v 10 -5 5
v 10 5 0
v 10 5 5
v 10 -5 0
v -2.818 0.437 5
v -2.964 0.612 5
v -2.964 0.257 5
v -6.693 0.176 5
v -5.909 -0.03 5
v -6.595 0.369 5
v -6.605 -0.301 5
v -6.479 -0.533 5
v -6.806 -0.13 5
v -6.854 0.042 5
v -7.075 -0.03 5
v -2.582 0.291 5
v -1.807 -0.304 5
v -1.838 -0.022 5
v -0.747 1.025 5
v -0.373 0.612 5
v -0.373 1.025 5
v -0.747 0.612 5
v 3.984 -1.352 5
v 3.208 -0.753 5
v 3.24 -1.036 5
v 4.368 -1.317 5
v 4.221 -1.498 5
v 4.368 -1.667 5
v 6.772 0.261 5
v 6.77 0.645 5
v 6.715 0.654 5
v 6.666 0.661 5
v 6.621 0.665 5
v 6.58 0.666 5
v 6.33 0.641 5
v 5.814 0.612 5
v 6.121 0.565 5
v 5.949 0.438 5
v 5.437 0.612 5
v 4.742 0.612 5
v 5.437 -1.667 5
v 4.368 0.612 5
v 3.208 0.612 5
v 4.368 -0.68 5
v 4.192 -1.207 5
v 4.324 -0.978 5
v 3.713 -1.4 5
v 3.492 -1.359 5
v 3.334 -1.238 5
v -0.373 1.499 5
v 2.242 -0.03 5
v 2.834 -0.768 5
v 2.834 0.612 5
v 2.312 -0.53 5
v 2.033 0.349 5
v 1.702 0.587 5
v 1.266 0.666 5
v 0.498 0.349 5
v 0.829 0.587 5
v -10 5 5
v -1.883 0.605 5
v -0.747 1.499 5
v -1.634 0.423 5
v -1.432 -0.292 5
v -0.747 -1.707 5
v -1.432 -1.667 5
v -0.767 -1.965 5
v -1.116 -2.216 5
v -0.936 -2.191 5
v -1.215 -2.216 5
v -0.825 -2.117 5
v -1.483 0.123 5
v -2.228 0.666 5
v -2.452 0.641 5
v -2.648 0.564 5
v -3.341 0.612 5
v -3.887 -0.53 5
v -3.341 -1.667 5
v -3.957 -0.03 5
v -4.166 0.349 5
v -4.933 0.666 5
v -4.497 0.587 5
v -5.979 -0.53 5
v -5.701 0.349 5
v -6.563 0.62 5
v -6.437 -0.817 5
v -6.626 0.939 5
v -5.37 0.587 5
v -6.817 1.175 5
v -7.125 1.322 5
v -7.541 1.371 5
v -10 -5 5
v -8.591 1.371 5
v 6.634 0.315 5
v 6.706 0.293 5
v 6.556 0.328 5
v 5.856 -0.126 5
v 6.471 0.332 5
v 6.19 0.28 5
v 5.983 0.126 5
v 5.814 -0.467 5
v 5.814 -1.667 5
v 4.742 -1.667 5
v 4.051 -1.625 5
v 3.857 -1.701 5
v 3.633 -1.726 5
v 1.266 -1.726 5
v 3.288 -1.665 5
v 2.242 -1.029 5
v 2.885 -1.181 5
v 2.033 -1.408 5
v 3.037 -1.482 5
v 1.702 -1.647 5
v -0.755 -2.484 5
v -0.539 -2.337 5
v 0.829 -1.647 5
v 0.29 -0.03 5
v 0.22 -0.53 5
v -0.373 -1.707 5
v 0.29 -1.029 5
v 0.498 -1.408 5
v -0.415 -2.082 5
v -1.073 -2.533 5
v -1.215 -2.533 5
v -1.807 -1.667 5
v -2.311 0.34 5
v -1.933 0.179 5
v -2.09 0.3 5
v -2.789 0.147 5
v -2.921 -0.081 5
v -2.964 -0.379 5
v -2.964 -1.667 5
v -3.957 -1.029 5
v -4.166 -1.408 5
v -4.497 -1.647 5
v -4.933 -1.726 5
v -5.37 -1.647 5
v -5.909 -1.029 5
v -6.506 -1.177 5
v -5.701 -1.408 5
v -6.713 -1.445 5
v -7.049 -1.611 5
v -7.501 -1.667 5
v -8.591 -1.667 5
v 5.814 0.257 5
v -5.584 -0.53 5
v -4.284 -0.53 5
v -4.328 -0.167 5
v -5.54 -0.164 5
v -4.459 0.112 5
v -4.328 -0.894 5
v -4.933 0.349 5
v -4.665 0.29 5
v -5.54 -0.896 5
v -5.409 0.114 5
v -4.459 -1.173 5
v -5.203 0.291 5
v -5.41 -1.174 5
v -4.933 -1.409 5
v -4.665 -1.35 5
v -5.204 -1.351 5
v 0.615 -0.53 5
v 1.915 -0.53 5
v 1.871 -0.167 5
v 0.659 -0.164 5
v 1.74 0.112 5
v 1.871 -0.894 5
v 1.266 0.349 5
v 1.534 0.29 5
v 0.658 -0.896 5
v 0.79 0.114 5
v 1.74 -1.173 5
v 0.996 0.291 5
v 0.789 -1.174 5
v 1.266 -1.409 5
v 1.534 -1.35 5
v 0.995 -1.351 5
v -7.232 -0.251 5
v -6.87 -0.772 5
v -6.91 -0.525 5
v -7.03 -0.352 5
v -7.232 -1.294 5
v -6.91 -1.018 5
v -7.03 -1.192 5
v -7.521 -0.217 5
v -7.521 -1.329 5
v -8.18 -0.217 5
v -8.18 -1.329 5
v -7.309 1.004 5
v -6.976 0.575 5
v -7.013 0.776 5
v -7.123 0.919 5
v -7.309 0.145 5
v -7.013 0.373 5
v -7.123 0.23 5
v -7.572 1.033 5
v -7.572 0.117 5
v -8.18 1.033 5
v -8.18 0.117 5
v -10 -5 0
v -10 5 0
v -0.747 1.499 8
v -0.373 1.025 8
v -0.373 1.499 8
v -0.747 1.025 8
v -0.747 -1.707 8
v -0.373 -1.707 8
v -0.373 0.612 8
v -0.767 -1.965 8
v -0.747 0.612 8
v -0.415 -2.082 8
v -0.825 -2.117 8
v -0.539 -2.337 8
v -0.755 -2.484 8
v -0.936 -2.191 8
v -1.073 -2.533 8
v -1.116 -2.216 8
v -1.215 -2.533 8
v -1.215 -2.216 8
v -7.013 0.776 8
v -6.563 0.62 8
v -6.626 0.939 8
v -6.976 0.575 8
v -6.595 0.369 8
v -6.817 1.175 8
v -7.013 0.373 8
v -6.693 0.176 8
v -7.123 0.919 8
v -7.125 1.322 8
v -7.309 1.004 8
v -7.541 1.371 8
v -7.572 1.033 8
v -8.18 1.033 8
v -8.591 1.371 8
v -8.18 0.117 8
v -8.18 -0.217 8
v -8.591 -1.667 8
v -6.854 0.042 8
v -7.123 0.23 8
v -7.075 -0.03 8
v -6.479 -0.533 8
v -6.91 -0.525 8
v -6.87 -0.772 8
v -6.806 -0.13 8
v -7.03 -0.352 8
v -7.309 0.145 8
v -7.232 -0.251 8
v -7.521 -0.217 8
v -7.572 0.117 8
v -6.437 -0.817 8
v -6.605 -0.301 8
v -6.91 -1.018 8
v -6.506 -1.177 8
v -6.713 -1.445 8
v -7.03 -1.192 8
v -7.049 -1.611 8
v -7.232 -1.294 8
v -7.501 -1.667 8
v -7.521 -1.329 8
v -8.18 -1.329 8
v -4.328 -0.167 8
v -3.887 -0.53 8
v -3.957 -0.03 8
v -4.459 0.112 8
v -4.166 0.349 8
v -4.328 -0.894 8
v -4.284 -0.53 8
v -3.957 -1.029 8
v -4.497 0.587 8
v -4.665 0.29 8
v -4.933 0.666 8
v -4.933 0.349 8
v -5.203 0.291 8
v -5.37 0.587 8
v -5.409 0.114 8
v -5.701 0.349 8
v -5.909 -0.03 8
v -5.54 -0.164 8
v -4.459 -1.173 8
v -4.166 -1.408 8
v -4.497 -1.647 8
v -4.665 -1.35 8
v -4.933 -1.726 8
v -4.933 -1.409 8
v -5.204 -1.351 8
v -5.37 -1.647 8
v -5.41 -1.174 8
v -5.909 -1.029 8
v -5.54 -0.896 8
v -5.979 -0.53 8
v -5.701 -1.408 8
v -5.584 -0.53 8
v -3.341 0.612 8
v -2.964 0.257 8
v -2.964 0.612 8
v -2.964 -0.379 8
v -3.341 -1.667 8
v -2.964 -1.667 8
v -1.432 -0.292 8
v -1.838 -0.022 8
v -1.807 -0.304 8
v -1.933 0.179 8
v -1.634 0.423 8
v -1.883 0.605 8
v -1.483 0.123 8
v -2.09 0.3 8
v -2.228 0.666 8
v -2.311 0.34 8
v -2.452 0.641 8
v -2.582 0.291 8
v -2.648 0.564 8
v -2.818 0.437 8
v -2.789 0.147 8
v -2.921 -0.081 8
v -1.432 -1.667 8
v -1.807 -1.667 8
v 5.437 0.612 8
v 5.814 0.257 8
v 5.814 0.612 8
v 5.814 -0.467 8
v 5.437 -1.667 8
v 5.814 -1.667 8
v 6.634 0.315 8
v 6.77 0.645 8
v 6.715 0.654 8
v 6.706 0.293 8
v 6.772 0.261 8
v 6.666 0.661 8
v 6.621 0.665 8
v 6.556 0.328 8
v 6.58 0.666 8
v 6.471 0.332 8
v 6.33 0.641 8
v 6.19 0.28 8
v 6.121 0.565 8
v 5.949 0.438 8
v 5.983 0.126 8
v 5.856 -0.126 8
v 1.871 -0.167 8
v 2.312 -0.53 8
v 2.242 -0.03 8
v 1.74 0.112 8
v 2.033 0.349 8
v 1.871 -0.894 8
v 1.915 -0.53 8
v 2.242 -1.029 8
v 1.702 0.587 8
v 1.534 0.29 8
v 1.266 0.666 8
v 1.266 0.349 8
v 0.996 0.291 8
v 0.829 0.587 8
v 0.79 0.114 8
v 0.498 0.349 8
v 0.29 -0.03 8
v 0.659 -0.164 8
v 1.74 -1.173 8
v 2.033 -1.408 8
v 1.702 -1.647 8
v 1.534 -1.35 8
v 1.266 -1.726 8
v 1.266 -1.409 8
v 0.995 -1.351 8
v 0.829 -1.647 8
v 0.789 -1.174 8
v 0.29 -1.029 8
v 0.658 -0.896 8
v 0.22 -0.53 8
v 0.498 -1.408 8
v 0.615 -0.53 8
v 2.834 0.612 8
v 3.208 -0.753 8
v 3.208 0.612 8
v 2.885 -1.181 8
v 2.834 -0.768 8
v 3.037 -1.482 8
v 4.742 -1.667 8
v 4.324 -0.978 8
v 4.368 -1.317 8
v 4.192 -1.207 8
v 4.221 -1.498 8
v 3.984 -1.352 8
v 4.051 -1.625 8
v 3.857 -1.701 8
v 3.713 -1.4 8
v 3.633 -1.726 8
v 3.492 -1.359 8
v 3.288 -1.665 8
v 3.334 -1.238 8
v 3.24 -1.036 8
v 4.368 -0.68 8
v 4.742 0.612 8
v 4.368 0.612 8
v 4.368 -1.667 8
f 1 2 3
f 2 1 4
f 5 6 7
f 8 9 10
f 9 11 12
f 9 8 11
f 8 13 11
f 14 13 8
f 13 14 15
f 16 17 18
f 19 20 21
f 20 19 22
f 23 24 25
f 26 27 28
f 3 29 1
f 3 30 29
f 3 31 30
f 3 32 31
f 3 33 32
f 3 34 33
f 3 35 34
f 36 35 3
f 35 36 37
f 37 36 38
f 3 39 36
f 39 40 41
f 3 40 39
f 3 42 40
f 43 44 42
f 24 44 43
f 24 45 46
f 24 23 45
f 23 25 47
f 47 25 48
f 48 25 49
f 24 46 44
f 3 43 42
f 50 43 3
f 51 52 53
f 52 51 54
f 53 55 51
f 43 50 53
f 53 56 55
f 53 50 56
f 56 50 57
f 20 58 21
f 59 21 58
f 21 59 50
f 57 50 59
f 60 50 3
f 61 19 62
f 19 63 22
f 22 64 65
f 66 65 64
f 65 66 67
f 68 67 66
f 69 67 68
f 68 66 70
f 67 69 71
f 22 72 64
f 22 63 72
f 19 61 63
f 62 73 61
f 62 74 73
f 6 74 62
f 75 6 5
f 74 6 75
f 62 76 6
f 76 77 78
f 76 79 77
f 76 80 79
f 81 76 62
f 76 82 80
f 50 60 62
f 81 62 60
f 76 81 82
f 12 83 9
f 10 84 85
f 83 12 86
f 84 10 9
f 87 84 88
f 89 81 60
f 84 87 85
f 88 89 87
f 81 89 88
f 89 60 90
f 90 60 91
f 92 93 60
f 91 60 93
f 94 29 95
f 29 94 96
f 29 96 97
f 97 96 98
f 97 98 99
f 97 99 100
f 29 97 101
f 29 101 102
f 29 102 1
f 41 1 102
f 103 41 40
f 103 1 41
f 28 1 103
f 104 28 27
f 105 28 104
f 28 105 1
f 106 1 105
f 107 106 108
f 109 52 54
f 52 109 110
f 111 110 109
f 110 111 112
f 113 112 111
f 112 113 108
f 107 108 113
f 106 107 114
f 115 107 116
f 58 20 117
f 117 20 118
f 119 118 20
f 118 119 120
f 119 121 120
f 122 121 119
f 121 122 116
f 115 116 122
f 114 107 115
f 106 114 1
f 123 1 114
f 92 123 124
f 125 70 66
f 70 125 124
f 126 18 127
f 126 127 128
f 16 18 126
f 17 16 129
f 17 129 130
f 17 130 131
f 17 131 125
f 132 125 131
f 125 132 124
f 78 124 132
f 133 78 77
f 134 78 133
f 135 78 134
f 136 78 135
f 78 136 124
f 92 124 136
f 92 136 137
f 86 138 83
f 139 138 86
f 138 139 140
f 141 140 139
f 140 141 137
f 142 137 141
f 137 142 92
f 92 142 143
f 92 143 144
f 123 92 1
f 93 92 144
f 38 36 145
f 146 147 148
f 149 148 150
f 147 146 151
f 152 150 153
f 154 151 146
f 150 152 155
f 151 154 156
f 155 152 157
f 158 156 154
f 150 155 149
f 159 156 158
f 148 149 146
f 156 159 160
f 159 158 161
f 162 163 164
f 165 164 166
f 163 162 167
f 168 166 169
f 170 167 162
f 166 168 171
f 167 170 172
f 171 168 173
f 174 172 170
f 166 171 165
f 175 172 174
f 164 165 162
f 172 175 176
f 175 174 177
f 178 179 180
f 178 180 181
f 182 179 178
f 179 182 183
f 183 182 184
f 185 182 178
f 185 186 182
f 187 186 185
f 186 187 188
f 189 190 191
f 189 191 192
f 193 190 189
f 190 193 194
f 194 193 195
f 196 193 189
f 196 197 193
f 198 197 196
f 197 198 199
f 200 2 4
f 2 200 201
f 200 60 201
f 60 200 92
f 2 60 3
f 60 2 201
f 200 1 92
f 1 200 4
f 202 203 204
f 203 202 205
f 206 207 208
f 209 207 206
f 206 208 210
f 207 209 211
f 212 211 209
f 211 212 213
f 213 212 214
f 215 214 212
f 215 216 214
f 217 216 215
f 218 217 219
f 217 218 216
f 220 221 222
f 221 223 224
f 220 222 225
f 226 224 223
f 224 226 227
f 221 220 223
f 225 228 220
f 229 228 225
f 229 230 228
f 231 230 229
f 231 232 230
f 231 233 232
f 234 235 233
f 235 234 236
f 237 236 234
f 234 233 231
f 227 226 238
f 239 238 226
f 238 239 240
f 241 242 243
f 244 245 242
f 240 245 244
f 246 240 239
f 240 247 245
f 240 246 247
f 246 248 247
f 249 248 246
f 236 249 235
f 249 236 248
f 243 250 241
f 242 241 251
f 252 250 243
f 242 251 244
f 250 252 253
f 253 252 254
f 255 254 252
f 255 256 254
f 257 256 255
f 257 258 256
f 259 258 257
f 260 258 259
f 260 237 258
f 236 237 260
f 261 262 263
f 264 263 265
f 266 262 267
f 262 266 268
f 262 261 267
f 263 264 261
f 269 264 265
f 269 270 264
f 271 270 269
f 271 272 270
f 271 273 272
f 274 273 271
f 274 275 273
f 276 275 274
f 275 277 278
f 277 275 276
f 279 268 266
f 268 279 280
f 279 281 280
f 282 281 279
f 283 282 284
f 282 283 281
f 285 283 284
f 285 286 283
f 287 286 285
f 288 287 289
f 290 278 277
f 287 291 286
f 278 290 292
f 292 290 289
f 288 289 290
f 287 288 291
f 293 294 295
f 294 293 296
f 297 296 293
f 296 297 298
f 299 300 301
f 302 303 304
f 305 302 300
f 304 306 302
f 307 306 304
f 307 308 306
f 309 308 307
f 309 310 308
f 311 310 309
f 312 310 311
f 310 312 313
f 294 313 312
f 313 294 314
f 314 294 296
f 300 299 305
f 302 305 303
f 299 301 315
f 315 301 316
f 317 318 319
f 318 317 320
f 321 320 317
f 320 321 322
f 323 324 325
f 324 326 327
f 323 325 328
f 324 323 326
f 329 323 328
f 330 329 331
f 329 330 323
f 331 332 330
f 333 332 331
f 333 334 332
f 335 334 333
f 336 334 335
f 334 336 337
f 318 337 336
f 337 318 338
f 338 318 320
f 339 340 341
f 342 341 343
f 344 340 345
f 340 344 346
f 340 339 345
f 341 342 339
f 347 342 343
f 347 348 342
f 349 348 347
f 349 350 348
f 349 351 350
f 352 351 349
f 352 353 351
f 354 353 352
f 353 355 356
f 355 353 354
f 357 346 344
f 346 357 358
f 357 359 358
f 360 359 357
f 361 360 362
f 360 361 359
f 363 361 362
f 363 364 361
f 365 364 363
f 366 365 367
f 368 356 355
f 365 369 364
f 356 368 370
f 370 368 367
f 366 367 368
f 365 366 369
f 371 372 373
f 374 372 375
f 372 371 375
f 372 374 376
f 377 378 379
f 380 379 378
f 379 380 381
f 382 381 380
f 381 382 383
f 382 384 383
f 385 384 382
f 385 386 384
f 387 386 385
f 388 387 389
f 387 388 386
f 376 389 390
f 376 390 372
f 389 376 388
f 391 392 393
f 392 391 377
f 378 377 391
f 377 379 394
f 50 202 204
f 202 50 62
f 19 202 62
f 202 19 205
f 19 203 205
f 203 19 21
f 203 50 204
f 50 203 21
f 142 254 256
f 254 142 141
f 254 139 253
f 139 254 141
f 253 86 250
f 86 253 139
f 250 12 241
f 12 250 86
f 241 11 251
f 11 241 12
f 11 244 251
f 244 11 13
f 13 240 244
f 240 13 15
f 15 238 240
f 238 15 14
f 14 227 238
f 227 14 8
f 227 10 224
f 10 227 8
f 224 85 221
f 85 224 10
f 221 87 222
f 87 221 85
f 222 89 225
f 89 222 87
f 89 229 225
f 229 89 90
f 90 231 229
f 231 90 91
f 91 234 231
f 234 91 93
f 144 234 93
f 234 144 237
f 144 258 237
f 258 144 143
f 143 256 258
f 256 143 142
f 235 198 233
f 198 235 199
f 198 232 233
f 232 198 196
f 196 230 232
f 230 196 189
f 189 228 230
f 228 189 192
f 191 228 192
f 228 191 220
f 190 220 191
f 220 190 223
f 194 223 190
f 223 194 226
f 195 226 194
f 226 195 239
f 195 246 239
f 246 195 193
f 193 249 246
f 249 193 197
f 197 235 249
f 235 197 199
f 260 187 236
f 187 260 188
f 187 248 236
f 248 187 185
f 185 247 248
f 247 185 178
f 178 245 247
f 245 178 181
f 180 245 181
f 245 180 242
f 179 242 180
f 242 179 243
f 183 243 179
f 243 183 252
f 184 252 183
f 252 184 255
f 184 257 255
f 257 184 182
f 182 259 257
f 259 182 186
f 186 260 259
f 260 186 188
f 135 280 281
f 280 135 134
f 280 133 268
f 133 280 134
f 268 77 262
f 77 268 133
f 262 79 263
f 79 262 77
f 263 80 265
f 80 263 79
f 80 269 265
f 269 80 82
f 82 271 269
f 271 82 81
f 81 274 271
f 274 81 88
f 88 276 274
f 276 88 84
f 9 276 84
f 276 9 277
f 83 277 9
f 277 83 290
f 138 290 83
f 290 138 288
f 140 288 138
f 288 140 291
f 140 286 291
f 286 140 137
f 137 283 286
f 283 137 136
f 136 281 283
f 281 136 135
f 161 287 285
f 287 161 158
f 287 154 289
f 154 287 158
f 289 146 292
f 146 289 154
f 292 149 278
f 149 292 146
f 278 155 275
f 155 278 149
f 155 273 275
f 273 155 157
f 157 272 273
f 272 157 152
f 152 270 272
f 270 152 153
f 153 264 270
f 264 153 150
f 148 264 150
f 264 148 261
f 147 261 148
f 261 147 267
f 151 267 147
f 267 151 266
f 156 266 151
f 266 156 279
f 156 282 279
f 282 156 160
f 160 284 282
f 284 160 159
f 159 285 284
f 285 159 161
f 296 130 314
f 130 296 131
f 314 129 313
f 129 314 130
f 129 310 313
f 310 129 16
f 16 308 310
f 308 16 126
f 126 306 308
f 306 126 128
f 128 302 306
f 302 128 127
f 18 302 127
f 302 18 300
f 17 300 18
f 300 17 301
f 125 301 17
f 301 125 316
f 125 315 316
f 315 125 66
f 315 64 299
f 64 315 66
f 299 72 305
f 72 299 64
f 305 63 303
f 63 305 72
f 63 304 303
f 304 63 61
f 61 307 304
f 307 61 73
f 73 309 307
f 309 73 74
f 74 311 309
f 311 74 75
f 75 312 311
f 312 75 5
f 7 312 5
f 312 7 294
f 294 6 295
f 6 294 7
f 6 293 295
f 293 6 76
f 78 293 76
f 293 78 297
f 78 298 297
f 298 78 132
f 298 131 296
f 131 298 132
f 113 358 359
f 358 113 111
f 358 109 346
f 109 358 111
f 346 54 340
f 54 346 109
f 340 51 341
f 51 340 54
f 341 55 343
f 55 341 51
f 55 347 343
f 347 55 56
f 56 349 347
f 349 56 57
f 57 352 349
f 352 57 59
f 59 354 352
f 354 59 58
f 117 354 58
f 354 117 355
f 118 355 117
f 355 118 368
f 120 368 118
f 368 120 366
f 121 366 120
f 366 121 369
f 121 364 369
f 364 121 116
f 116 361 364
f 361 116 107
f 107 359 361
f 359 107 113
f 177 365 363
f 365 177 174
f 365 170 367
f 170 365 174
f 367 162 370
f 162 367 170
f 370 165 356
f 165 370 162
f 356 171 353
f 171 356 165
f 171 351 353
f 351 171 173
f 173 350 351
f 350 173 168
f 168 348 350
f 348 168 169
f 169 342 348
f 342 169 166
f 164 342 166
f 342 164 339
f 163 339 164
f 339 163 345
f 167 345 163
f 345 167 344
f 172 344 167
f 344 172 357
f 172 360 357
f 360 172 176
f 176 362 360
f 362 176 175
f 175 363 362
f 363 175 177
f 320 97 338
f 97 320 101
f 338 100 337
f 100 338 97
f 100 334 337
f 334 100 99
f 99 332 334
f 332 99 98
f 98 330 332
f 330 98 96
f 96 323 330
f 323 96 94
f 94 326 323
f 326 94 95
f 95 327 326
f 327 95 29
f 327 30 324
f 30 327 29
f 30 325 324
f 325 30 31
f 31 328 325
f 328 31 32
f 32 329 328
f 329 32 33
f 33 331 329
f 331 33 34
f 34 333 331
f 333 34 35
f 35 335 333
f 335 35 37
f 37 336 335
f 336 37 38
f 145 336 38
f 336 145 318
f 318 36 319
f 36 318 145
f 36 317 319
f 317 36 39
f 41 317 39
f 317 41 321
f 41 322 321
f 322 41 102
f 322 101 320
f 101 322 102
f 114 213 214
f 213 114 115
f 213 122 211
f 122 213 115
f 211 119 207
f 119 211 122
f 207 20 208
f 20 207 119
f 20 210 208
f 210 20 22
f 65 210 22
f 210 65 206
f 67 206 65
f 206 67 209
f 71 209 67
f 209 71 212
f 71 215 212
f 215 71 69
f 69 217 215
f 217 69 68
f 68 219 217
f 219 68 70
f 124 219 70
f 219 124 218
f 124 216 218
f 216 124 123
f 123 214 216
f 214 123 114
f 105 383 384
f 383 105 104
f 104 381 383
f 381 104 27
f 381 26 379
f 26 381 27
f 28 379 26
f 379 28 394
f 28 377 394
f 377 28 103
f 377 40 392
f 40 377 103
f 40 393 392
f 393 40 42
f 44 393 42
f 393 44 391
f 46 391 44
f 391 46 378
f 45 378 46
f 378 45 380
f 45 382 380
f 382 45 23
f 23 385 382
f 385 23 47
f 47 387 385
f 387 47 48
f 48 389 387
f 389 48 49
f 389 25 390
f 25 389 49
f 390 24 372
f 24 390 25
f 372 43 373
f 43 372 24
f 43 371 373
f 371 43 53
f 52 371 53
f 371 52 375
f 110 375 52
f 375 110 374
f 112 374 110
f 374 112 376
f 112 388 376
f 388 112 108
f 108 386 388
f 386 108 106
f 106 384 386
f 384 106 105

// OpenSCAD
$fn = 10; 
texte_a_inserer = "Bonjour"; 
taille = 3; 
police = "DejaVuSans"; //[[Abril Fatface,Aclonica,Acme,Advent Pro,Akronim,Aladin,Alegreya,Alegreya Sans,Alegreya SC,Alex Brush,Alfa Slab One,Alice,Amaranth,Architects Daughter,Archivo Black,Archivo Narrow,Arimo,Arvo,Asap,Astloch,Asul,Averia Libre,Averia Serif Libre,Bangers,Basic,Belgrano,Berkshire Swash,Bigshot One,Bilbo Swash Caps,Black Ops One,Bonbon,Bowlby One SC,Brawler,Bubblegum Sans,Butterfly Kids,Cabin Condensed,Caesar Dressing,Cagliostro,Calligraffitti,Capriola,Carter One,Changa One,Chango,Chelsea Market,Cherry Cream Soda,Chewy,Chicle,Chivo,Clicker Script,Coming Soon,Concert One,Condiment,Cookie,Courgette,Covered By Your Grace,Crimson Text,Dancing Script,DejaVu Sans,DejaVu Serif,Dhurjati,Doppio One,Dosis,Droid Sans,Eagle Lake,Electrolize,Emilys Candy,Encode Sans,Encode Sans Compressed,Euphoria Script,Exo,Exo 2,Faster One,Federo,Finger Paint,Fjord One,Fontdiner Swanky,Freckle Face,Fruktur,Gabriela,Geo,Germania One,Give You Glory,Gloria Hallelujah,Goudy Bookletter 1911,Graduate,Grand Hotel,Great Vibes,Griffy,Hanalei Fill,Happy Monkey,Henny Penny,Hind,IM Fell English SC,Indie Flower,Irish Grover,Italianno,Jacques Francois Shadow,Jolly Lodger,Josefin Slab,Joti One,Judson,Just Another Hand,Kalam,Kameron,Karma,Kavoon,Knewave,Kranky,Kristi,Laila,Lakki Reddy,Lancelot,Lato,Leckerli One,Ledger,Lekton,Lemon One,Liberation Sans,Libre Caslon Text,Life Savers,Lilita One,Lily Script One,Limelight,Lobster,Lobster Two,Londrina Outline,Londrina Shadow,Londrina Solid,Lora,Love Ya Like A Sister,Loved by the King,Lovers Quarrel,Luckiest Guy,Lusitana,Macondo,Macondo Swash Caps,Mako,Marck Script,Margarine,Marko One,Maven Pro,McLaren,MedievalSharp,Merienda One,Merriweather,Mervale Script,Metal Mania,Metrophobic,Milonga,Miltonian Tattoo,Miss Fajardose,Molle,Montez,Montserrat,Mr De Haviland,Mystery Quest,Neucha,New Rocker,Niconne,Nosifer,Nothing You Could Do,Noto Sans Oriya,Noto Serif,Nova Square,Nunito,Old Standard TT,Oleo Script,Oleo Script Swash Caps,Orbitron,Oregano,Orienta,Original Surfer,Oswald,Over the Rainbow,Overlock,Oxygen,Pacifico,Paprika,Parisienne,Patrick Hand SC,Paytone One,Peralta,Permanent Marker,Piedra,Pirata One,Play,Playball,Poetsen One,Poppins,Press Start 2P,Princess Sofia,PT Mono,Qwigley,Racing Sans One,Raleway,Rancho,Ranga,Ribeye,Roboto,Roboto Condensed,Roboto Slab,Rochester,Rock Salt,Rubik One,Sail,Salsa,Sansita One,Sarina,Satisfy,Schoolbell,Seaweed Script,Sevillana,Shadows Into Light,Shadows Into Light Two,Share,Six Caps,Skranji,Source Sans Pro,Spicy Rice,Stardos Stencil,Stoke,Syncopate,Teko,Terminal Dosis,The Girl Next Door,Tillana,Timmana,Titillium Web,Ubuntu,Ultra,Underdog,UnifrakturCook,UnifrakturMaguntia,Vampiro One,Vidaloka,Viga,Voces,Volkhov,Vollkorn,Voltaire,Waiting for the Sunrise,Wallpoet,Wellfleet,Wendy One,Yellowtail,Yesteryear,Zeyada]]
hauteur = 3; 
longueur_cube = 20; 
largeur_cube = 10; 
hauteur_cube = 5; 
// relief = relief  extrusion = extru
relief = "relief"; //[relief,extru]
module rendu(){
linear_extrude(hauteur) text(texte_a_inserer,size = taille, font = police);
}
module finao(){
if ( relief== "relief") {
   union(){
 translate([0,0,0])   cube([longueur_cube,largeur_cube,hauteur_cube]);
translate([1,(largeur_cube/3),hauteur_cube]) rendu();
   } 
}
else
{
difference(){
 translate([0,0,0])   cube([longueur_cube,largeur_cube,hauteur_cube]);
translate([1,(largeur_cube/3),(hauteur_cube -hauteur+0.1)]) rendu();
}
 }
}
translate ([-(longueur_cube/2),-(largeur_cube/2),0]) finao();
